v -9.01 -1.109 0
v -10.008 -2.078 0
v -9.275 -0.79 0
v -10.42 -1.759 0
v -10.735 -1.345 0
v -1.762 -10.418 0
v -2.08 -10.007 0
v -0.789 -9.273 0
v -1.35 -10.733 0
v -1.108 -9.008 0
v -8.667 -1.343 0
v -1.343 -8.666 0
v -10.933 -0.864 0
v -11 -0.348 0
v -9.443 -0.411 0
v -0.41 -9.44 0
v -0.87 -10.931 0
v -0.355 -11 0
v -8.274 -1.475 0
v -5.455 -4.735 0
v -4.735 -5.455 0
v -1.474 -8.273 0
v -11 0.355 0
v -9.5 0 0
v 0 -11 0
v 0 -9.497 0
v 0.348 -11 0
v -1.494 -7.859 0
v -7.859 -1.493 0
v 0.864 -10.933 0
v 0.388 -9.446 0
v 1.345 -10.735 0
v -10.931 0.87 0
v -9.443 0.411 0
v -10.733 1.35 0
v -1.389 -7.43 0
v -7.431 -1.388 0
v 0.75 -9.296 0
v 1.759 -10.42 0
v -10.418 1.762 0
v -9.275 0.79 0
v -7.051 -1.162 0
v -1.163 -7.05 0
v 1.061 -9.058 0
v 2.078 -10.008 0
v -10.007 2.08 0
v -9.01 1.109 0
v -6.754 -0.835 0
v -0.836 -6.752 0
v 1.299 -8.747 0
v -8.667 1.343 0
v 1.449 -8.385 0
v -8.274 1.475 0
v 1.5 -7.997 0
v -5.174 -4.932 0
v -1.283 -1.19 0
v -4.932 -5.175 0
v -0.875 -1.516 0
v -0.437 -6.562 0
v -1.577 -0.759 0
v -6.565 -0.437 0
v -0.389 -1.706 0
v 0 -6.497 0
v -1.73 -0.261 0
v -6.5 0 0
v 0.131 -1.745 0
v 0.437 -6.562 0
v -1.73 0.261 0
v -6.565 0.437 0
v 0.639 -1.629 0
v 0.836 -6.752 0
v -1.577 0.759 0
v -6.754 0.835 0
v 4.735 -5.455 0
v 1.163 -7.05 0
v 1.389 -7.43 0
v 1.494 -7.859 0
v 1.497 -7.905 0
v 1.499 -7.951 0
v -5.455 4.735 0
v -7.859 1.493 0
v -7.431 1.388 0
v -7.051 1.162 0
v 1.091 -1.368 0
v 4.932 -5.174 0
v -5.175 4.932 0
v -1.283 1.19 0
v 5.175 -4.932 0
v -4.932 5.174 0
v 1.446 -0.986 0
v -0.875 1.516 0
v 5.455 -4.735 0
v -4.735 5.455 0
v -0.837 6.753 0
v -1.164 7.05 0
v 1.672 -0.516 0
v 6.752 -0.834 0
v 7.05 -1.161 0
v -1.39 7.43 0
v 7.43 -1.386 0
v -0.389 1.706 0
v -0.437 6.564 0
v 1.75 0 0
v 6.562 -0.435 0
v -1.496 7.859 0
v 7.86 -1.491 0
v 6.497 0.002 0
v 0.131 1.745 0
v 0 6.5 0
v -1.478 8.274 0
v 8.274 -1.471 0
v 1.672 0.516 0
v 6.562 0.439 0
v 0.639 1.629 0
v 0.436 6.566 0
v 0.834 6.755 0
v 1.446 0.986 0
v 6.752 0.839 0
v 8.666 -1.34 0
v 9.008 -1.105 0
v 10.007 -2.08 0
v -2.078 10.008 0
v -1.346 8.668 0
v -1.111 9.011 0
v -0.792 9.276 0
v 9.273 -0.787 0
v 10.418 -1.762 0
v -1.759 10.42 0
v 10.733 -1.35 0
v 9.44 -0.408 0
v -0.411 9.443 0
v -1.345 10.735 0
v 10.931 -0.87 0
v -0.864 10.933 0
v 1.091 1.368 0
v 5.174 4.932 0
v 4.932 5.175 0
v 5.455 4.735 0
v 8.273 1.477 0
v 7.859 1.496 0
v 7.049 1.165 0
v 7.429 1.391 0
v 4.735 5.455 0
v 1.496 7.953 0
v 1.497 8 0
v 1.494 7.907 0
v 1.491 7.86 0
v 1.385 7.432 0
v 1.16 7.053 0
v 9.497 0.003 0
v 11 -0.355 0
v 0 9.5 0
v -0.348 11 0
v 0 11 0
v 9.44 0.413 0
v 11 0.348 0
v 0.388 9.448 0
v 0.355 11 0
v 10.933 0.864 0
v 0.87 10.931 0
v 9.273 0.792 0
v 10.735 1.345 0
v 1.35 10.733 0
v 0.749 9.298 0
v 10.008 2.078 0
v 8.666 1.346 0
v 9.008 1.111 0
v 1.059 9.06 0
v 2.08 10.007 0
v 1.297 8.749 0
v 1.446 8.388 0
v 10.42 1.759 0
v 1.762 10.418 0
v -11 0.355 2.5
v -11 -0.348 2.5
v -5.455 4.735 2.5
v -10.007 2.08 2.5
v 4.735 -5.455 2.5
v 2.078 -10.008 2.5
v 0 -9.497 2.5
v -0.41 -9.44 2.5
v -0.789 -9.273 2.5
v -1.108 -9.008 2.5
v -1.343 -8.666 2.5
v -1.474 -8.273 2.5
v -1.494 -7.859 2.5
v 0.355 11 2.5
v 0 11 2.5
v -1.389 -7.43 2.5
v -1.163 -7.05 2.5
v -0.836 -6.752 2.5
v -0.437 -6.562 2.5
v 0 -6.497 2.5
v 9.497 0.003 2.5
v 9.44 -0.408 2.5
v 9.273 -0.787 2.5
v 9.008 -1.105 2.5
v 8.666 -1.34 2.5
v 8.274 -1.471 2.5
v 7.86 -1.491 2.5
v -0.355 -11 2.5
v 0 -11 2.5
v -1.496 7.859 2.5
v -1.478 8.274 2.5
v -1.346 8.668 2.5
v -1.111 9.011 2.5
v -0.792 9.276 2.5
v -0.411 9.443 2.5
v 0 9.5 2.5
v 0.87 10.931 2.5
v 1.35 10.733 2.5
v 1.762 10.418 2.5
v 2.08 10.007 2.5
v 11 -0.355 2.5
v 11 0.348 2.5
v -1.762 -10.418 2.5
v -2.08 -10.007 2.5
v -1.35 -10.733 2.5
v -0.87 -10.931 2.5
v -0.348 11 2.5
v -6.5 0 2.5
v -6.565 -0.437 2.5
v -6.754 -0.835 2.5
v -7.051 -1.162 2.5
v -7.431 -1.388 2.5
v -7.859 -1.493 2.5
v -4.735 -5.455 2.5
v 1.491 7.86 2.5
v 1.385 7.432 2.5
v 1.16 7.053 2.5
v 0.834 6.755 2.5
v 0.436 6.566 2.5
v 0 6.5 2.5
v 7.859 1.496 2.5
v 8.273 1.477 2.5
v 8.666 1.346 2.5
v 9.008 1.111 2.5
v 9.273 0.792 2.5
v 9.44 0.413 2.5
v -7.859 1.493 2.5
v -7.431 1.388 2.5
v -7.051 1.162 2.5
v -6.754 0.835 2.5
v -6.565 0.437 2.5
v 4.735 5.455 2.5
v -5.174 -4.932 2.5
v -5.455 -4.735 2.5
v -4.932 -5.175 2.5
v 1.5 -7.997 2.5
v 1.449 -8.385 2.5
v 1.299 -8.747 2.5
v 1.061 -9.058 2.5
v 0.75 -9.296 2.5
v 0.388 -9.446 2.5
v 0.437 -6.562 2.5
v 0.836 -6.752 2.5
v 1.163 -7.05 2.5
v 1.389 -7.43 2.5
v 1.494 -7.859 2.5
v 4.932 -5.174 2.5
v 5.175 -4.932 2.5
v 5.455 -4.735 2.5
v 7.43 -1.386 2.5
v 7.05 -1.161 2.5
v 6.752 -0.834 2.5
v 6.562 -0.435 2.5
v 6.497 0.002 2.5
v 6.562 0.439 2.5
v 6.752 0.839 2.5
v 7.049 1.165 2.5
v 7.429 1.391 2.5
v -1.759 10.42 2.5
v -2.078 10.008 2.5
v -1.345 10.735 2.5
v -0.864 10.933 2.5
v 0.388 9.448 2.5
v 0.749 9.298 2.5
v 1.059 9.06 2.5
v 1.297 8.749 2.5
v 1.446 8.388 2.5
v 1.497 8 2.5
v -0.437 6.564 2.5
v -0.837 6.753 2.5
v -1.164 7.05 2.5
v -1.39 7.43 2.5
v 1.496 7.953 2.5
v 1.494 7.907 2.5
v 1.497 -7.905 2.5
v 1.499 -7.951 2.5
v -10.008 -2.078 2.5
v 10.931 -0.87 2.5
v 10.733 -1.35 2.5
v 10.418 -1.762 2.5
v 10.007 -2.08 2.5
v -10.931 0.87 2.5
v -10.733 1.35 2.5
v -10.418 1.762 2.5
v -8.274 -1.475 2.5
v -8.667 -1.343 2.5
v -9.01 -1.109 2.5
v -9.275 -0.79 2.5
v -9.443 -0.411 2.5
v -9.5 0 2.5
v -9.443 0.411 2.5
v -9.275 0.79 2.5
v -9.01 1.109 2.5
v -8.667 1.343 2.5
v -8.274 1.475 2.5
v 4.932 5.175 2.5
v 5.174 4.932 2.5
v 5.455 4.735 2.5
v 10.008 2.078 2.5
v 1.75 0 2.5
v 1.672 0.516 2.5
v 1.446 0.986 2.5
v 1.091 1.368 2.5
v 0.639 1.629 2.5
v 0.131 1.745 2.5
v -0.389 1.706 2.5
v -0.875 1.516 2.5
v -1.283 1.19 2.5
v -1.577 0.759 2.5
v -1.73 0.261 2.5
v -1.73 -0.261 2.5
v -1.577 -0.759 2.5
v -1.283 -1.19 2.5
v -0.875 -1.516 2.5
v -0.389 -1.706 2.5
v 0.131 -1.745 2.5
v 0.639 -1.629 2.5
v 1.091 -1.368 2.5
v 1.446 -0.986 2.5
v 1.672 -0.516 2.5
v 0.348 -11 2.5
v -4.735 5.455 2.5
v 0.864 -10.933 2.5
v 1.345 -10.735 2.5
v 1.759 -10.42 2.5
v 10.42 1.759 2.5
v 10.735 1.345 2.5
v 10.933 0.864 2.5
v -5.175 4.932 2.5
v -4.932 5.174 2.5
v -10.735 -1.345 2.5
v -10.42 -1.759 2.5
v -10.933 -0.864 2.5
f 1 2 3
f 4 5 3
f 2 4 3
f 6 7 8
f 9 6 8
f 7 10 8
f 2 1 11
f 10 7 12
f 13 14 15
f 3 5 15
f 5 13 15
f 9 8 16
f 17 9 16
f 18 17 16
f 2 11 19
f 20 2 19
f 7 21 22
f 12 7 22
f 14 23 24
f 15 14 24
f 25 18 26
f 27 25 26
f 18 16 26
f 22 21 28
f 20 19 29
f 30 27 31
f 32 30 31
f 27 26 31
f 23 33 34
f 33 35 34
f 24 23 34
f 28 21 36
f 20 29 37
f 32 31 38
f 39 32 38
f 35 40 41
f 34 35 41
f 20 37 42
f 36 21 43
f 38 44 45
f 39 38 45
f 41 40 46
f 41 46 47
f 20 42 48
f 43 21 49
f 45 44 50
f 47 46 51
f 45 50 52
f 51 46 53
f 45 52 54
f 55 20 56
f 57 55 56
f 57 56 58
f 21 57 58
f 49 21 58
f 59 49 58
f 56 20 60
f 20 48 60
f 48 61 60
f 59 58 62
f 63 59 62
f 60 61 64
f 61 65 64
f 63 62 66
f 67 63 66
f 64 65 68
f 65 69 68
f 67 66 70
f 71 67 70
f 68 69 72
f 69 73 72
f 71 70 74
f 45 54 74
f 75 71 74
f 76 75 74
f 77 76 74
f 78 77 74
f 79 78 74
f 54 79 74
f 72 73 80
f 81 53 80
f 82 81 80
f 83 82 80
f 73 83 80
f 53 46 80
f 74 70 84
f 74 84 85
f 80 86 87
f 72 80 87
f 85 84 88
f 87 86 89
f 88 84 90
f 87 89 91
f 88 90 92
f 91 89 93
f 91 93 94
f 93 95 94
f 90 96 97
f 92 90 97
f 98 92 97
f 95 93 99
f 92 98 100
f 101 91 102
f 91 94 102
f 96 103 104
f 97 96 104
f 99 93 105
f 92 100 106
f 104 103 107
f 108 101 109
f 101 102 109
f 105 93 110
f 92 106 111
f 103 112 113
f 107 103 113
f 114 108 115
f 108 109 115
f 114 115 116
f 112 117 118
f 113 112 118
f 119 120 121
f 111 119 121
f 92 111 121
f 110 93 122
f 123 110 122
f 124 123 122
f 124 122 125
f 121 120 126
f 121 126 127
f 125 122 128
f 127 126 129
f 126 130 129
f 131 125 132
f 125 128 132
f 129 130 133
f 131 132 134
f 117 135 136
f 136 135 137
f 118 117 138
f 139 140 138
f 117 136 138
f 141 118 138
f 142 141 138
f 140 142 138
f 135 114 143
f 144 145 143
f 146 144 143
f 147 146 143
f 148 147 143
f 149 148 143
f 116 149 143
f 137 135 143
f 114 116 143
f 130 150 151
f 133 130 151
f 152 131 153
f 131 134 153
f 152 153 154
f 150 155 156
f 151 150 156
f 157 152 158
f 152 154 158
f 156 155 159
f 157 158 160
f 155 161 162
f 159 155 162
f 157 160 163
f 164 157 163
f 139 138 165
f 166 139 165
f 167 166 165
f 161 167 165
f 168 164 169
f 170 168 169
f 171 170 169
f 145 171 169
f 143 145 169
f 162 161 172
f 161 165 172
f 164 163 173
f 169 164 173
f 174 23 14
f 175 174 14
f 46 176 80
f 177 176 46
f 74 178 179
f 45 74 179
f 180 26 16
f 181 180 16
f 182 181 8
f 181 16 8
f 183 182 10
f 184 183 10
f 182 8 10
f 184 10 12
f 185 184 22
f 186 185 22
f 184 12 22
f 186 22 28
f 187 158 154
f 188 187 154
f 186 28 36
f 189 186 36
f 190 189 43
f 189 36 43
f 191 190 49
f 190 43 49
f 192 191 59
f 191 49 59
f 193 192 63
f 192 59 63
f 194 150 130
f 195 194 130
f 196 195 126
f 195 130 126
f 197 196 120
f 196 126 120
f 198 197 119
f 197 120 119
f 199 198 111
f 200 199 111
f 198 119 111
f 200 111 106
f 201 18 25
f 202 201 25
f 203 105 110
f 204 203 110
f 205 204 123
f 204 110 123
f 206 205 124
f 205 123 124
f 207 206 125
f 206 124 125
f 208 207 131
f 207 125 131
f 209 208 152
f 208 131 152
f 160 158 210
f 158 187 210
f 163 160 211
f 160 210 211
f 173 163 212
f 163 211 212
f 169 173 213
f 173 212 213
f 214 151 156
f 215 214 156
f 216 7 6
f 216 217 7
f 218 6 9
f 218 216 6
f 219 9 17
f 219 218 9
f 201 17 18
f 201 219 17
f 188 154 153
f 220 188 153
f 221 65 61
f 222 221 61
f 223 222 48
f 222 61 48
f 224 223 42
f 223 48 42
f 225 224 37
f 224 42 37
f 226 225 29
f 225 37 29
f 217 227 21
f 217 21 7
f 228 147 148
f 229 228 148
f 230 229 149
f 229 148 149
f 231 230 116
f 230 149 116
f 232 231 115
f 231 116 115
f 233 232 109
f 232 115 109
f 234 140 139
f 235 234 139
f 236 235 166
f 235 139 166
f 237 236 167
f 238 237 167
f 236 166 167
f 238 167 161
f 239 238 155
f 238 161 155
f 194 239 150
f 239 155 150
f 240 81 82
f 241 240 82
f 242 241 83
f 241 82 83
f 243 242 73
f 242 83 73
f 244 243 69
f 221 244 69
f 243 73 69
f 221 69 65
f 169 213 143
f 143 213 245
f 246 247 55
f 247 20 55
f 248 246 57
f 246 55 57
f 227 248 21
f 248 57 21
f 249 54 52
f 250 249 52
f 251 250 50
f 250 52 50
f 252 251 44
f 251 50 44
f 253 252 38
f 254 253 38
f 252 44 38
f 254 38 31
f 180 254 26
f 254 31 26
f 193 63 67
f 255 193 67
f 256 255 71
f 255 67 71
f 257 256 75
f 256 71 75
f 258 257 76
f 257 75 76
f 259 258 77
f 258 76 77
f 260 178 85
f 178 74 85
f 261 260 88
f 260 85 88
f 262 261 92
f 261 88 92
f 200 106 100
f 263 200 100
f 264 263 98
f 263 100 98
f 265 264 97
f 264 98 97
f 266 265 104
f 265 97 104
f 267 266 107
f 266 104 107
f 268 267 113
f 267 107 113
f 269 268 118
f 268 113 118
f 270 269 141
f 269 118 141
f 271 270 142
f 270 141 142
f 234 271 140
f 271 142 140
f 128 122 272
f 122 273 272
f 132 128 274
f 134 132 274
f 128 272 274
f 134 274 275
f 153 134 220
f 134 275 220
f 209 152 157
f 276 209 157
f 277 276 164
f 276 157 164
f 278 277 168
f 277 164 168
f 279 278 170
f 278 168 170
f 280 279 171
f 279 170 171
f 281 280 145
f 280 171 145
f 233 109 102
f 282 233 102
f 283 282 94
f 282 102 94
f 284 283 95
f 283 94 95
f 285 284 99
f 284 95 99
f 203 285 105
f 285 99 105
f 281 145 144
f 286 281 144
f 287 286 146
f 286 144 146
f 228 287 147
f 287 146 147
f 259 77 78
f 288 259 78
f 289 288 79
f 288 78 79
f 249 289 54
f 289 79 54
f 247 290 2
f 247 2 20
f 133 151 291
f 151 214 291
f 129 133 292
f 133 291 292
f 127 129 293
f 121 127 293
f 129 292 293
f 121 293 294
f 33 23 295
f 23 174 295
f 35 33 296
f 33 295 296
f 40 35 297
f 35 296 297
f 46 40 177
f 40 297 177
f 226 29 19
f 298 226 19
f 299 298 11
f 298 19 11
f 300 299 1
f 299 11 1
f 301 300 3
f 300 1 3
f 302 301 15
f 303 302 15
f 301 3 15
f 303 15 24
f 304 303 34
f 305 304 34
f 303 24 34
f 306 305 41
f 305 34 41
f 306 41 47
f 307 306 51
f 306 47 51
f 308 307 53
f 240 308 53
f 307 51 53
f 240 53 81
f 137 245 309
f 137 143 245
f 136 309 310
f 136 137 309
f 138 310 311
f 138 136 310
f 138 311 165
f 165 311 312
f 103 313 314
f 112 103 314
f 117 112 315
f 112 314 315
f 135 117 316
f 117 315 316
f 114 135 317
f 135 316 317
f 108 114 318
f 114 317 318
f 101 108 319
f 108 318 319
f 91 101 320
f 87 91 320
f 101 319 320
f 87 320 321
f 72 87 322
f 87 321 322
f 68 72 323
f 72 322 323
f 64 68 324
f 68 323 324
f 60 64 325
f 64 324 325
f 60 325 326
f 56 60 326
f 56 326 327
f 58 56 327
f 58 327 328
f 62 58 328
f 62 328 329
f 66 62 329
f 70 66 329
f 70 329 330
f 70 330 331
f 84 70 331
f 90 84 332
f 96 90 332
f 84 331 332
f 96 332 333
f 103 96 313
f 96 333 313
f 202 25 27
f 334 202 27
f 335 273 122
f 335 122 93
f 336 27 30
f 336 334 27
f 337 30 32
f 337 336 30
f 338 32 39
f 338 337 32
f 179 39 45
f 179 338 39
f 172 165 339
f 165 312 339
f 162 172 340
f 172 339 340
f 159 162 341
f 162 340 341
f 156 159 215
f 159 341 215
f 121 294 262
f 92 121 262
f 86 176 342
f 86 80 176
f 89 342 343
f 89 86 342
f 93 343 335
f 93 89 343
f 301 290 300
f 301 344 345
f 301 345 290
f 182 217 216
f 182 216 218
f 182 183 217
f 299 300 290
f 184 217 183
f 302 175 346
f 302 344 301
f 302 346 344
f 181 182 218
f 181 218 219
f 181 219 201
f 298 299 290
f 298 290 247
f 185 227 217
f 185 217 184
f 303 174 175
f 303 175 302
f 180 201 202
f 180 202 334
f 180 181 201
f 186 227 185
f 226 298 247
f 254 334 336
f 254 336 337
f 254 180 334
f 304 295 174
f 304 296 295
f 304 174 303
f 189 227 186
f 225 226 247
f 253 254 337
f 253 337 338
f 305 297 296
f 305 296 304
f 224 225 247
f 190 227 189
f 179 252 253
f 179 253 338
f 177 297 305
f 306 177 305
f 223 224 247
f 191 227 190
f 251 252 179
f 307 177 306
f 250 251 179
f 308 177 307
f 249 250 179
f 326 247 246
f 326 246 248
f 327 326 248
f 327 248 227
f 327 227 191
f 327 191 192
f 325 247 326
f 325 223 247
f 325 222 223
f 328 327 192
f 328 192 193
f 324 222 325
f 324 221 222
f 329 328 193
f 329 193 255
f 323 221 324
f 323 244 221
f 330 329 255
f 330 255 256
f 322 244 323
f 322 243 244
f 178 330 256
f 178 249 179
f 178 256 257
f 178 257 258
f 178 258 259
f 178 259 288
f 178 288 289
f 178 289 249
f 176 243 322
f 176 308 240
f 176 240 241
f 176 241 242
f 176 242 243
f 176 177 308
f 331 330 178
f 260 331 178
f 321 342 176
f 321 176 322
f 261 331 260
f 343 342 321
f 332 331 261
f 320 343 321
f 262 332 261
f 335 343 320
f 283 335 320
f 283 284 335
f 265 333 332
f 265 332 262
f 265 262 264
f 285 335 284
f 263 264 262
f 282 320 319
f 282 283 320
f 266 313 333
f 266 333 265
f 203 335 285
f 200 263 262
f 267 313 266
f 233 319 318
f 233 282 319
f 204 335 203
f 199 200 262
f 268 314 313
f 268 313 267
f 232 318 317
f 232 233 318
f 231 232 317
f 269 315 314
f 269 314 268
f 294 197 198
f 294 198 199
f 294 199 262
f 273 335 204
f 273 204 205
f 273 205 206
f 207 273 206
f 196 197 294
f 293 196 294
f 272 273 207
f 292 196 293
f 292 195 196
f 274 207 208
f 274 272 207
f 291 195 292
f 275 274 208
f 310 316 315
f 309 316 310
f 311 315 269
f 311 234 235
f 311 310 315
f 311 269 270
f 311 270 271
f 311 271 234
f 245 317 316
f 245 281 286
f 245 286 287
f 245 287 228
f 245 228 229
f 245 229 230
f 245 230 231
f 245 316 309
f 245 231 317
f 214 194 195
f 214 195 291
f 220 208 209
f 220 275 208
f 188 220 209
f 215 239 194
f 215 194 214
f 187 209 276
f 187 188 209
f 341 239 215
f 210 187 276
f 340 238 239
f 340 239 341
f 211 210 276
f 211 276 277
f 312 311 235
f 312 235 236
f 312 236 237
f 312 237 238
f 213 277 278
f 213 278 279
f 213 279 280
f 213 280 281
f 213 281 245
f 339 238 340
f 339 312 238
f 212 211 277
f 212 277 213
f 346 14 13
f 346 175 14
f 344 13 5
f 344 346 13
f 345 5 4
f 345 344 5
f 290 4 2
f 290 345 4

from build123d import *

# Parameters (mm, degrees)
BOSS_EXTRUDE1_DEPTH = 2.5
CUT_EXTRUDE1_DEPTH  = 2.5
SKETCH3_R           = 1.75
CUT_EXTRUDE2_DEPTH  = 2.5
FILLET1_R           = 2


with BuildPart() as part:
    # Sketch1 → Boss-Extrude1 (new body)
    with BuildSketch(Plane.XY):
        with BuildLine():
            Line((-5, 6.244997998), (-5, 7.5))
            Line((-5, 7.5), (-10.998080575, 1.501919425))
            Line((-10.998080575, 1.501919425), (-11.001951051, -1.498048949))
            Line((-11.001951051, -1.498048949), (-5, -7.5))
            Line((-5, -7.5), (-5, -6.244997998))
            ThreePointArc((-5, -6.244997998), (-6.854583671, -4.124885779), (-7.859375, -1.493393655))
            ThreePointArc((-7.859375, -1.493393655), (-9.5, 0), (-7.859375, 1.493393655))
            ThreePointArc((-7.859375, 1.493393655), (-6.854583671, 4.124885779), (-5, 6.244997998))
        make_face()
        with BuildLine():
            Line((0, 9.499997384), (0, 11.00001831))
            Line((0, 11.00001831), (-1.498048949, 11.001951051))
            Line((-1.498048949, 11.001951051), (-5, 7.5))
            Line((-5, 7.5), (-5, 6.244997998))
            ThreePointArc((-5, 6.244997998), (-3.346805661, 7.266284599), (-1.496145717, 7.85885157))
            ThreePointArc((-1.496145717, 7.85885157), (-1.111300148, 9.010559559), (0, 9.499997384))
        make_face()
        with BuildLine():
            Line((1.501919425, 10.998080575), (0, 11.00001831))
            Line((0, 11.00001831), (0, 9.499997384))
            ThreePointArc((0, 9.499997384), (1.058848726, 9.059669249), (1.497198557, 8))
            ThreePointArc((1.497198557, 8), (1.495558351, 7.929872059), (1.490641319, 7.859897484))
            ThreePointArc((1.490641319, 7.859897484), (3.344260945, 7.267456139), (5, 6.244997998))
            Line((5, 6.244997998), (5, 7.5))
            Line((5, 7.5), (1.501919425, 10.998080575))
        make_face()
        with BuildLine():
            Line((11.001951051, 1.498048949), (5, 7.5))
            Line((5, 7.5), (5, 6.244997998))
            ThreePointArc((5, 6.244997998), (6.853793729, 4.126198193), (7.858802525, 1.496403311))
            ThreePointArc((7.858802525, 1.496403311), (9.007744437, 1.111312618), (9.497198557, 0.002801443))
            ThreePointArc((9.497198557, 0.002801443), (9.00813269, -1.105355666), (7.859848986, -1.490897019))
            ThreePointArc((7.859848986, -1.490897019), (6.855238728, -4.123797035), (5, -6.244997998))
            Line((5, -6.244997998), (5, -7.5))
            Line((5, -7.5), (10.998080575, -1.501919425))
            Line((10.998080575, -1.501919425), (11.001951051, 1.498048949))
        make_face()
        with BuildLine():
            ThreePointArc((-1.493650301, -7.859326229), (-3.345652024, -7.266815846), (-5, -6.244997998))
            Line((-5, -6.244997998), (-5, -7.5))
            Line((-5, -7.5), (-1.501919425, -10.998080575))
            Line((-1.501919425, -10.998080575), (0, -11.00001831))
            Line((0, -11.00001831), (0, -9.497198557))
            ThreePointArc((0, -9.497198557), (-1.108333995, -9.007938758), (-1.493650301, -7.859326229))
        make_face()
        with BuildLine():
            Line((5, -7.5), (5, -6.244997998))
            ThreePointArc((5, -6.244997998), (3.345652024, -7.266815846), (1.493650301, -7.859326229))
            ThreePointArc((1.493650301, -7.859326229), (1.498411734, -7.928189323), (1.5, -7.997198557))
            ThreePointArc((1.5, -7.997198557), (1.060660172, -9.057858728), (0, -9.497198557))
            Line((0, -9.497198557), (0, -11.00001831))
            Line((0, -11.00001831), (1.498048949, -11.001951051))
            Line((1.498048949, -11.001951051), (5, -7.5))
        make_face()
        with BuildLine():
            ThreePointArc((0, 6.500002616), (-1.011288975, 6.889615878), (-1.496145717, 7.85885157))
            ThreePointArc((-1.496145717, 7.85885157), (-3.346805661, 7.266284599), (-5, 6.244997998))
            Line((-5, 6.244997998), (-5, -6.244997998))
            ThreePointArc((-5, -6.244997998), (-3.345652024, -7.266815846), (-1.493650301, -7.859326229))
            ThreePointArc((-1.493650301, -7.859326229), (-1.010740201, -6.888864561), (0, -6.497198557))
            Line((0, -6.497198557), (0, 6.500002616))
        make_face()
        with BuildLine():
            Line((-5, -6.244997998), (-5, 6.244997998))
            ThreePointArc((-5, 6.244997998), (-6.854583671, 4.124885779), (-7.859375, 1.493393655))
            ThreePointArc((-7.859375, 1.493393655), (-6.890735041, 1.009718401), (-6.5, 0))
            ThreePointArc((-6.5, 0), (-6.890735041, -1.009718401), (-7.859375, -1.493393655))
            ThreePointArc((-7.859375, -1.493393655), (-6.854583671, -4.124885779), (-5, -6.244997998))
        make_face()
        with BuildLine():
            Line((5, -6.244997998), (5, 6.244997998))
            ThreePointArc((5, 6.244997998), (3.344260945, 7.267456139), (1.490641319, 7.859897484))
            ThreePointArc((1.490641319, 7.859897484), (1.008146228, 6.891855241), (0, 6.500002616))
            Line((0, 6.500002616), (0, -6.497198557))
            ThreePointArc((0, -6.497198557), (1.010740201, -6.888864561), (1.493650301, -7.859326229))
            ThreePointArc((1.493650301, -7.859326229), (3.345652024, -7.266815846), (5, -6.244997998))
        make_face()
        with BuildLine():
            ThreePointArc((7.858802525, 1.496403311), (6.853793729, 4.126198193), (5, 6.244997998))
            Line((5, 6.244997998), (5, -6.244997998))
            ThreePointArc((5, -6.244997998), (6.855238728, -4.123797035), (7.859848986, -1.490897019))
            ThreePointArc((7.859848986, -1.490897019), (6.497198649, 0.002275989), (7.858802525, 1.496403311))
        make_face()
    extrude(amount=BOSS_EXTRUDE1_DEPTH)

    # Sketch2 → Cut-Extrude1 (cut)
    with BuildSketch(Plane.XY.offset(2.5)):
        Polygon((-5, 5), (-10.998080575, 1.501919425), (-1.498048949, 11.001951051), align=None)
        Polygon((-5, -5), (-1.501919425, -10.998080575), (-11.001951051, -1.498048949), align=None)
        Polygon((1.501919425, 10.998080575), (5, 5), (11.001951051, 1.498048949), align=None)
        Polygon((10.998080575, -1.501919425), (5, -5), (1.498048949, -11.001951051), align=None)
    extrude(amount=-CUT_EXTRUDE1_DEPTH, mode=Mode.SUBTRACT)

    # Sketch3 → Cut-Extrude2 (cut)
    with BuildSketch(Plane.XY.offset(2.5)):
        Circle(SKETCH3_R)
    extrude(amount=-CUT_EXTRUDE2_DEPTH, mode=Mode.SUBTRACT)

    # Fillet1
    fillet1_edges = [part.edges().sort_by_distance(p)[0] for p in [
        (1.498048949, -11.001951051, 1.25),
        (-1.501919425, -10.998080575, 1.25),
        (-11.001951051, -1.498048949, 1.25),
        (-10.998080575, 1.501919425, 1.25),
        (-1.498048949, 11.001951051, 1.25),
        (1.501919425, 10.998080575, 1.25),
        (11.001951051, 1.498048949, 1.25),
        (10.998080575, -1.501919425, 1.25),
        (-5, -5, 1.25),
        (5, 5, 1.25),
        (5, -5, 1.25),
        (-5, 5, 1.25),
    ]]
    fillet(fillet1_edges, radius=FILLET1_R)


solid = part.part
